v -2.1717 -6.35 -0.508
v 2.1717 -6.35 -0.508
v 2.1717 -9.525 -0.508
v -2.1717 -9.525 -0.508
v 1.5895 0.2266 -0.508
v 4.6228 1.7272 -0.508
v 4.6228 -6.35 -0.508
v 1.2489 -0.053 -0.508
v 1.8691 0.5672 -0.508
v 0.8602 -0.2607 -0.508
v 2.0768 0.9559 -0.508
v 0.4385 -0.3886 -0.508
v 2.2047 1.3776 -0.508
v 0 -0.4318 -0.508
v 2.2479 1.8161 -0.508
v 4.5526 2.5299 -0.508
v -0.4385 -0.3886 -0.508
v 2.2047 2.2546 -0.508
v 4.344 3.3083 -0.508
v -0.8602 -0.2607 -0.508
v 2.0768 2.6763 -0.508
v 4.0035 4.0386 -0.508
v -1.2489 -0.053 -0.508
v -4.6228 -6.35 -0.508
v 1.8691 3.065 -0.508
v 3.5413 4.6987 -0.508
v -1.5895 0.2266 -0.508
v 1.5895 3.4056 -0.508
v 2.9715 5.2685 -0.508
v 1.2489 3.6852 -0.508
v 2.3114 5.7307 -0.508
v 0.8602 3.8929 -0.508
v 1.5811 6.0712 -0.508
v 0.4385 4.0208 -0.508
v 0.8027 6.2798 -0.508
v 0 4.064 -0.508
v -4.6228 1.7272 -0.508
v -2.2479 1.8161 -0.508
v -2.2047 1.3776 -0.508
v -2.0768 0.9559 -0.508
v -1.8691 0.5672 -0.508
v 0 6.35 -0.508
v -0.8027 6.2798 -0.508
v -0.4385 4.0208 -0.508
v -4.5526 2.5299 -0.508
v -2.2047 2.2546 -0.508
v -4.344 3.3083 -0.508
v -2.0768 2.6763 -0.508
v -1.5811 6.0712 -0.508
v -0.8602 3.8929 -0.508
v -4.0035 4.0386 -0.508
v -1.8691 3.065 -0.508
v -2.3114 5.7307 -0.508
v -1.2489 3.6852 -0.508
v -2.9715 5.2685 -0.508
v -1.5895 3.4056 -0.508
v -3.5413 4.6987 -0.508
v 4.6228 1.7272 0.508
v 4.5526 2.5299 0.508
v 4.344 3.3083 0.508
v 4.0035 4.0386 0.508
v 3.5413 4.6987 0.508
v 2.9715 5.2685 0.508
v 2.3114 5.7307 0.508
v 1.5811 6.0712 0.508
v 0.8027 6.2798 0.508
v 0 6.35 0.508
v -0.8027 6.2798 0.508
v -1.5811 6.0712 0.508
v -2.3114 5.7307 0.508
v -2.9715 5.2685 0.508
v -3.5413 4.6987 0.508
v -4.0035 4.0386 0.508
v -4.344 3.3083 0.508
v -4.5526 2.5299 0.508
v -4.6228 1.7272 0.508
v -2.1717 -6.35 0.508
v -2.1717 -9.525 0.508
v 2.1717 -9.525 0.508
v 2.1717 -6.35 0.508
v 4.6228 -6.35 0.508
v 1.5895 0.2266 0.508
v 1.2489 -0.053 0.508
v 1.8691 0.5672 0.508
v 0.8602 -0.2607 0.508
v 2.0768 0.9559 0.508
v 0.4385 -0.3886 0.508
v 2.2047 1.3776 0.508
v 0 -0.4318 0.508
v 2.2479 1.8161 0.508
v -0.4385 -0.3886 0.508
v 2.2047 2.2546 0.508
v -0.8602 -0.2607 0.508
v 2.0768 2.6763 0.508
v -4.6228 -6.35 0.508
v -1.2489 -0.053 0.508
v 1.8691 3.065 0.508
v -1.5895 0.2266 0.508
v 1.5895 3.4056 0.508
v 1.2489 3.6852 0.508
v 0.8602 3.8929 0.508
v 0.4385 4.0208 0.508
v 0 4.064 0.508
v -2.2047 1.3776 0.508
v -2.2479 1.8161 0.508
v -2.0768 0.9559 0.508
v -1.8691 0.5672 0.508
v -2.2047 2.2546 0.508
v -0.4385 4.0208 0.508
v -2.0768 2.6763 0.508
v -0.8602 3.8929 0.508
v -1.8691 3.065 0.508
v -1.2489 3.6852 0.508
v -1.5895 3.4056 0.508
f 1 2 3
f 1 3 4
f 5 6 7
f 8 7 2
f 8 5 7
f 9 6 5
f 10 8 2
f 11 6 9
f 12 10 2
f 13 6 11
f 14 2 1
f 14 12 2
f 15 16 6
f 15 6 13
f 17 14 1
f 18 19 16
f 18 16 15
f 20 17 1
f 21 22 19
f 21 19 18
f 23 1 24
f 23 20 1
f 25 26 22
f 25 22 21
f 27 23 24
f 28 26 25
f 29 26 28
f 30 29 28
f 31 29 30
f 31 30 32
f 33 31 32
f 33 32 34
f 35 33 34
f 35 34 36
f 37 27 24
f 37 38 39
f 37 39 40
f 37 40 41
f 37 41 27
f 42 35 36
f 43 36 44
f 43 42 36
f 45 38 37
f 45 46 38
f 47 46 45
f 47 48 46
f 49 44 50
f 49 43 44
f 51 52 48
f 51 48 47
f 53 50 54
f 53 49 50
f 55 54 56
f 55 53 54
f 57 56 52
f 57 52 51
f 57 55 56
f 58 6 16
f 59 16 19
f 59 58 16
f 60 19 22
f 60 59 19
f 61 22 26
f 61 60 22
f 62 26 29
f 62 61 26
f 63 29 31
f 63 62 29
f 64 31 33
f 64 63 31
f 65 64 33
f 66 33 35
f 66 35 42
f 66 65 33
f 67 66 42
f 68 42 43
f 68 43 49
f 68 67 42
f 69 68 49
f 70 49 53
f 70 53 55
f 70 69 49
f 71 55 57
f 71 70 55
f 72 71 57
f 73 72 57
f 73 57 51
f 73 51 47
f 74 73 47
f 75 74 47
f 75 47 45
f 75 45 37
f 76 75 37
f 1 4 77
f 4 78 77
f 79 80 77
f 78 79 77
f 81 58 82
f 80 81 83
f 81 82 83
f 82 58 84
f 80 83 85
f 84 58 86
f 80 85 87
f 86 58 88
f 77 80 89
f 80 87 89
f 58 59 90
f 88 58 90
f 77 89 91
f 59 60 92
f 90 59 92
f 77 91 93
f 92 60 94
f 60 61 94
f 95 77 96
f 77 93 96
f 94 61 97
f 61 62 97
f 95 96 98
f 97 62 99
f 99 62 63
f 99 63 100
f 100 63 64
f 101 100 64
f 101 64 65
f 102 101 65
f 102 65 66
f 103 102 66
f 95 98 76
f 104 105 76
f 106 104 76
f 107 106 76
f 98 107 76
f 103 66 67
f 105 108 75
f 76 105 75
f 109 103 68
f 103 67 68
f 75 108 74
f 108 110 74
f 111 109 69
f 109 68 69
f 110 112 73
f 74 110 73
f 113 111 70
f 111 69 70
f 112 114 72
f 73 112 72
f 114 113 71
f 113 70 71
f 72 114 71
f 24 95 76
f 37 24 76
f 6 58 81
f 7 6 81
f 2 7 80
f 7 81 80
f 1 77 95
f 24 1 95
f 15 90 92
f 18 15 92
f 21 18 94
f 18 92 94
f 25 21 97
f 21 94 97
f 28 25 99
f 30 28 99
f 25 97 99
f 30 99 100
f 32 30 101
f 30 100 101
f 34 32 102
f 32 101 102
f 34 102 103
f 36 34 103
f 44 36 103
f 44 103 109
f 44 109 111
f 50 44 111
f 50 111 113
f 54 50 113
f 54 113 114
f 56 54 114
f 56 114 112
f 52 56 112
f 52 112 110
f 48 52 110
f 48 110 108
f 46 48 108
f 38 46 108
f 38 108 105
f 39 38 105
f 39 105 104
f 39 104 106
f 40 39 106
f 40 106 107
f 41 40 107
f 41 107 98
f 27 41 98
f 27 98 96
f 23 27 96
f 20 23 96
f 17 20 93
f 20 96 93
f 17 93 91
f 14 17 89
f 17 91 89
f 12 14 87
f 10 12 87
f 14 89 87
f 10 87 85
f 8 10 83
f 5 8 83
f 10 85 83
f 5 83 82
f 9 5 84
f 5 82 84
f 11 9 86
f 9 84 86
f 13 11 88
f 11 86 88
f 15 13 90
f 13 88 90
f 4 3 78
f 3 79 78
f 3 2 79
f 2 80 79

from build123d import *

# Parameters (mm, degrees)
BOSS_EXTRUDE1_DEPTH = 0.508
SKETCH2_R           = 2.2479
CUT_EXTRUDE1_DEPTH  = 11.636172283
FILLET1_RADIUS      = 4.6228
FILLET1_LENGTH      = 1.016


with BuildPart() as part:
    # Sketch1 → Boss-Extrude1 (new, symmetric)
    with BuildSketch(Plane.XY):
        Polygon((-4.6228, 6.35), (4.6228, 6.35), (4.6228, -6.35), (2.1717, -6.35), (2.1717, -9.525), (-2.1717, -9.525), (-2.1717, -6.35), (-4.6228, -6.35), align=None)
    extrude(amount=BOSS_EXTRUDE1_DEPTH, both=True)

    # Sketch2 → Cut-Extrude1 (cut, through all)
    with BuildSketch(Plane.XY.offset(0.508)):
        with Locations((0, 1.8161)):
            Circle(SKETCH2_R)
    extrude(amount=-CUT_EXTRUDE1_DEPTH, mode=Mode.SUBTRACT)

    # Fillet1: full round fillet: the end face becomes a half cylinder, R = half its width
    fillet1_face = Plane((0, 6.35, 0), x_dir=(0, 0, 1), z_dir=(0, 1, 0))  # on the end face: x along it, z out of the body
    fillet1_slab = fillet1_face.offset(-FILLET1_RADIUS / 2) * Box(FILLET1_LENGTH, 2 * FILLET1_RADIUS, FILLET1_RADIUS, mode=Mode.PRIVATE)  # the body's end, R deep
    fillet1_round = Plane((0, 1.7272, 0), x_dir=(0, 1, 0), z_dir=(0, 0, 1)) * Cylinder(FILLET1_RADIUS, FILLET1_LENGTH, mode=Mode.PRIVATE)  # its axis R under the face
    add(fillet1_slab - fillet1_round, mode=Mode.SUBTRACT)


solid = part.part
